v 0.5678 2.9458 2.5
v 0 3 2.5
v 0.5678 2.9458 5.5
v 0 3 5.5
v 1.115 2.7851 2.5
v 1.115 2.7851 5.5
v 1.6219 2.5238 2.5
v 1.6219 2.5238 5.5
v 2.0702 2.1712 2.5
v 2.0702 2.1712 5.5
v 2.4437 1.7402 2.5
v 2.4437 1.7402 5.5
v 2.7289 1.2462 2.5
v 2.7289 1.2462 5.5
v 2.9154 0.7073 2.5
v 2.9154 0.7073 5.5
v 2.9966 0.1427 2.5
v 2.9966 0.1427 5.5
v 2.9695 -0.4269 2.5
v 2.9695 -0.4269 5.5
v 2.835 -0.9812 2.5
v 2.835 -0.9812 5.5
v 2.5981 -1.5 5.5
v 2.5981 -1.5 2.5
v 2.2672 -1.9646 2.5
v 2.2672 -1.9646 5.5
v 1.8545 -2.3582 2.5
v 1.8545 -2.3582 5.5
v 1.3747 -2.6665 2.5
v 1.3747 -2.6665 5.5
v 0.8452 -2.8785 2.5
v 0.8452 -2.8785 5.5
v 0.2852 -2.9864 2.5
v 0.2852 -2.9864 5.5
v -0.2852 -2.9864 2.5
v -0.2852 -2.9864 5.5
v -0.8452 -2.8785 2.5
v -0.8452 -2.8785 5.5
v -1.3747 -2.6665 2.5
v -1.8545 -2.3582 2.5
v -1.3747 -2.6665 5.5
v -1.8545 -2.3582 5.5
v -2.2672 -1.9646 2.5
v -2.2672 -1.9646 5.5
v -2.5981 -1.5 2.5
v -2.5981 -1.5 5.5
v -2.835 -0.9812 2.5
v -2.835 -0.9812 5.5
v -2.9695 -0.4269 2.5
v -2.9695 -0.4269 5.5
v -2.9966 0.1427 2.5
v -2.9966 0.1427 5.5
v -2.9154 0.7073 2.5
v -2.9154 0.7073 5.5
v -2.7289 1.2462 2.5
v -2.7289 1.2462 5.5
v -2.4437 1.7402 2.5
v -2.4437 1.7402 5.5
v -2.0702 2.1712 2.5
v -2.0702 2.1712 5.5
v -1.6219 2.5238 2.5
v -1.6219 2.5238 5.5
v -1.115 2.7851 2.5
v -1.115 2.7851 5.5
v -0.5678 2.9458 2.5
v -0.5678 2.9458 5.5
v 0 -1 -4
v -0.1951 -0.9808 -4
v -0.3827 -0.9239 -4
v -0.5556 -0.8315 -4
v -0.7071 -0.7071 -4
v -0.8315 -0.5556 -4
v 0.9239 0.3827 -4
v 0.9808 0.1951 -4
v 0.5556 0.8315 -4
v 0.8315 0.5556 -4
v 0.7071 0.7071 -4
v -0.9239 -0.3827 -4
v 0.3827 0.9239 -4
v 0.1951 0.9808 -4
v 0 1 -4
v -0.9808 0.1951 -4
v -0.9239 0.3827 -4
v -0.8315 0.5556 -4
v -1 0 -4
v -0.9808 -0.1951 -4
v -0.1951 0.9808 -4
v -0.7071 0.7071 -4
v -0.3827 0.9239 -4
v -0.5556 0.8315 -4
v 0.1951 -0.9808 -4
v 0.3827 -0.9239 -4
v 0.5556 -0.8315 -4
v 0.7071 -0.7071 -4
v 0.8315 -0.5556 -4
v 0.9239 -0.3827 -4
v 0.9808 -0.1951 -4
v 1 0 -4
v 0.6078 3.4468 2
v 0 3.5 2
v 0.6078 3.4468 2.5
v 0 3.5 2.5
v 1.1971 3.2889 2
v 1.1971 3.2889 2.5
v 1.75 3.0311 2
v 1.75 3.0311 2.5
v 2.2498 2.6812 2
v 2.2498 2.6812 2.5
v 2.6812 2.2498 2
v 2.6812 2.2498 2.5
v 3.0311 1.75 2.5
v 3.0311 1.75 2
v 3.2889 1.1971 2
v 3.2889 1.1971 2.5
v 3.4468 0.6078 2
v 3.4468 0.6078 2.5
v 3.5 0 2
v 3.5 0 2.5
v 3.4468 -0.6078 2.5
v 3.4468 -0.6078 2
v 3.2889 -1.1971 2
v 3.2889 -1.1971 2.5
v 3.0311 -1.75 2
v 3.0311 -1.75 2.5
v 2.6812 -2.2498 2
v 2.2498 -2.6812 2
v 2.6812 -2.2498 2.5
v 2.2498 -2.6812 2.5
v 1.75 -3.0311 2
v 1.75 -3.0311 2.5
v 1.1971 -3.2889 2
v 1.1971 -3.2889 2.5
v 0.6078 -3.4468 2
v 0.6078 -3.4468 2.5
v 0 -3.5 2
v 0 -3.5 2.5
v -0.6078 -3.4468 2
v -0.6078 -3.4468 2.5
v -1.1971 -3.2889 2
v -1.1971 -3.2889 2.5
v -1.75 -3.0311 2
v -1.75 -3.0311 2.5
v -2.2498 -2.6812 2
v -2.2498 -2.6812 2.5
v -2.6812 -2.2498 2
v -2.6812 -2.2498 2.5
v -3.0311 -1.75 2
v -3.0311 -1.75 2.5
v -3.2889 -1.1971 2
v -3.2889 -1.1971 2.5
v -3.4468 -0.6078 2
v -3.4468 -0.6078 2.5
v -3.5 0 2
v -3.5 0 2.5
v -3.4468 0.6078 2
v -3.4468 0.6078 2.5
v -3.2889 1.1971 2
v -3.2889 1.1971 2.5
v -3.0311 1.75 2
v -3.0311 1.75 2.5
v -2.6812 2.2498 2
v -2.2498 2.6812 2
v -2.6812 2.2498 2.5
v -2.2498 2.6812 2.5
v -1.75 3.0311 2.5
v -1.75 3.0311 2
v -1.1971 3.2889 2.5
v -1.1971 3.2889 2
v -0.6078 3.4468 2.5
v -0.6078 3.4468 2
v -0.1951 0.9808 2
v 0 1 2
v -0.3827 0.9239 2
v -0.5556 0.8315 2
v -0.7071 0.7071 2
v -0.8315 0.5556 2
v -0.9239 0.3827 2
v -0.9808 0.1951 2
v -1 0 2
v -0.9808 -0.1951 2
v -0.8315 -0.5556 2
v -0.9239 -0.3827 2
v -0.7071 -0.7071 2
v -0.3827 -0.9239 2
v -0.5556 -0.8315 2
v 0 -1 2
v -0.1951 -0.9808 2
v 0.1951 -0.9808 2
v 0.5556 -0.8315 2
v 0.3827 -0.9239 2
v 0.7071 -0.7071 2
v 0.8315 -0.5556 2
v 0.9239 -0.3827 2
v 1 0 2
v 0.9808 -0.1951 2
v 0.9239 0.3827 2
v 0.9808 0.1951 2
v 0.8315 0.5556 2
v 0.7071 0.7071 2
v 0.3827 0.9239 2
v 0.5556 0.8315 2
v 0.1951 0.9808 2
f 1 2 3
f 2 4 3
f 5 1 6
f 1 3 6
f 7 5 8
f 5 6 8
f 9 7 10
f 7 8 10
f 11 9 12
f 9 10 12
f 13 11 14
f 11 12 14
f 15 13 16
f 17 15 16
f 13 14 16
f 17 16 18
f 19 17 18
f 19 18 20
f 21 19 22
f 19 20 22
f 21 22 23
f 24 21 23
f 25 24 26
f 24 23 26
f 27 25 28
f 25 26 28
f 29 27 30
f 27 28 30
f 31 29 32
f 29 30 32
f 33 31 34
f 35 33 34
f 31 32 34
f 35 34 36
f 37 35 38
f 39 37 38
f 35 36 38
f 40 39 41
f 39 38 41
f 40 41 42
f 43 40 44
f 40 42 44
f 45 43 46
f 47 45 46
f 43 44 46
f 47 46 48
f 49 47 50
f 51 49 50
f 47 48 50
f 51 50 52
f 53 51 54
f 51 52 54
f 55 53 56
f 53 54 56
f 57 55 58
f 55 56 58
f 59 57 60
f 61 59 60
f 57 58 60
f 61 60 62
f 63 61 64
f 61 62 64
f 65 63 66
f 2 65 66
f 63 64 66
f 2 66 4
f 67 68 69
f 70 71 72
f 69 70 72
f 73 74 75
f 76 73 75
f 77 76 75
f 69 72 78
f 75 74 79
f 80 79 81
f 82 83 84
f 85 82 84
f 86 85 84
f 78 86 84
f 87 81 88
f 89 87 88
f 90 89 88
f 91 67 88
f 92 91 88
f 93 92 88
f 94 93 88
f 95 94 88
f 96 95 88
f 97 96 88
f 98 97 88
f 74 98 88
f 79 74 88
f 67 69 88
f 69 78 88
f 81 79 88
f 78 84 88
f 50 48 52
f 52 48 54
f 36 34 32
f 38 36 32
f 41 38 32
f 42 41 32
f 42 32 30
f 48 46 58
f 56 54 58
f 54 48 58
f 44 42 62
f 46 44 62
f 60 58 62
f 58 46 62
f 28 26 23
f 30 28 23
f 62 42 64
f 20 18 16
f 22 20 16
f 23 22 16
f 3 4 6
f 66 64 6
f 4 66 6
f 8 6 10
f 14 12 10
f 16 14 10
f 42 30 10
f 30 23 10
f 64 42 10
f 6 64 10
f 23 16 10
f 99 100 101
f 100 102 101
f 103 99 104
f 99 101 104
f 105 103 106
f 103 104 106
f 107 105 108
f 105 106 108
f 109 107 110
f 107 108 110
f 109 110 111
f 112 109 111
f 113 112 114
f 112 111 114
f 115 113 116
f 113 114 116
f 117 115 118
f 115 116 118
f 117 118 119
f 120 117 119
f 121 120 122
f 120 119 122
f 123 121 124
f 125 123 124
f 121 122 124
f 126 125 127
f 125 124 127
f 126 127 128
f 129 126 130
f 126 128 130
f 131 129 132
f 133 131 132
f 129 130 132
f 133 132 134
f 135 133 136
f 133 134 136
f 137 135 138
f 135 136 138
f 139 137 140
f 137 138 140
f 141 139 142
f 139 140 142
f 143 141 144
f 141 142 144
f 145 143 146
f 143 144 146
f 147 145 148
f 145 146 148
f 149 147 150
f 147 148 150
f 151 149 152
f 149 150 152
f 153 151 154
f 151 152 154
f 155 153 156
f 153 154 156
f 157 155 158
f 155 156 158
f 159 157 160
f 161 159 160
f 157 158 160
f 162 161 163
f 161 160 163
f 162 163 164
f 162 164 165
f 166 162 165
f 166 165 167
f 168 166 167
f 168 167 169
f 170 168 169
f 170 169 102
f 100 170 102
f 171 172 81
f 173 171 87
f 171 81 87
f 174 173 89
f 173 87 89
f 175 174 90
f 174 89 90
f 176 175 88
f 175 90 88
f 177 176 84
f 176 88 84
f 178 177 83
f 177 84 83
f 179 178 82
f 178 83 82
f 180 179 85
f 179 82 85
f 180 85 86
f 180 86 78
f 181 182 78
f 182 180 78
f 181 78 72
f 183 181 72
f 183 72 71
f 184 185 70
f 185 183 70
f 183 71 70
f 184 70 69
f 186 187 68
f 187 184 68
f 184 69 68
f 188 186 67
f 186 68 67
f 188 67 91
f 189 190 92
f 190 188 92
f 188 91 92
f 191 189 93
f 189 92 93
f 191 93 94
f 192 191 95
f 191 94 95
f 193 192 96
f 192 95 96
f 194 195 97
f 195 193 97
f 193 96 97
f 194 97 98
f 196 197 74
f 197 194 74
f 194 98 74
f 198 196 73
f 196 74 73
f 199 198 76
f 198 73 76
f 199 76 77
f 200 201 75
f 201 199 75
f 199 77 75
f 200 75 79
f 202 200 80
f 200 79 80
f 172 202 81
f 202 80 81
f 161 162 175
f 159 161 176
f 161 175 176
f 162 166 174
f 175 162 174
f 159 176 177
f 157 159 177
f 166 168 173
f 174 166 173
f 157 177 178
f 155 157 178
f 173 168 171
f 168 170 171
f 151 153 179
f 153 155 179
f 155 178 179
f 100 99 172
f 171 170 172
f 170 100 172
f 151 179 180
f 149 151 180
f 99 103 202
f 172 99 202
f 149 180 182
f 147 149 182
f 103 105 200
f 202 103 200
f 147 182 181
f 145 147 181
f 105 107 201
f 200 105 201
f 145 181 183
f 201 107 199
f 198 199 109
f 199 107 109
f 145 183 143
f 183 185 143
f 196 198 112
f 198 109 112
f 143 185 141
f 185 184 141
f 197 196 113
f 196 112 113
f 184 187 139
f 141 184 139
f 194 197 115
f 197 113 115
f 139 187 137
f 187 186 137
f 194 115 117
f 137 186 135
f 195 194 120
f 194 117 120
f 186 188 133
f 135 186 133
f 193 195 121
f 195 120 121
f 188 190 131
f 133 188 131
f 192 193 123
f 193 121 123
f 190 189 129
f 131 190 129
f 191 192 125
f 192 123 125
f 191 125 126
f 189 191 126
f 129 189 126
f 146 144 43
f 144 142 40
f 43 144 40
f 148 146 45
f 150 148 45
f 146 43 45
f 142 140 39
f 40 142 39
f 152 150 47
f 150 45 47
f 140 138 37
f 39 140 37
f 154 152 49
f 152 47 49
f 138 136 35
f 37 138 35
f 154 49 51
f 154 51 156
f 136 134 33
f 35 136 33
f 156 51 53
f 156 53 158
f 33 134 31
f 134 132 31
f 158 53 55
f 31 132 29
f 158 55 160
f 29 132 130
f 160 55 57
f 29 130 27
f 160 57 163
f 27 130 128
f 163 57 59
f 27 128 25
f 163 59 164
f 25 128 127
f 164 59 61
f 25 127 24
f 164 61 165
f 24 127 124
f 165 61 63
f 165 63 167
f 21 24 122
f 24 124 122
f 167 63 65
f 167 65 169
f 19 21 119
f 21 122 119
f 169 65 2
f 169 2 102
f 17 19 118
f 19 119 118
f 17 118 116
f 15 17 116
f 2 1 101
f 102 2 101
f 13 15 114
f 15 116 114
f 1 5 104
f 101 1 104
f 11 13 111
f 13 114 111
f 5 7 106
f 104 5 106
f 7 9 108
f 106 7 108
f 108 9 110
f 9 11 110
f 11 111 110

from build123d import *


with BuildPart() as part:
    # Skizze1 → Rotation1 (revolve)
    with BuildSketch(Plane(origin=(0, 0, 0), x_dir=(0, 0, -1), z_dir=(1, 0, 0))):
        Polygon((4, 1), (4, 0), (-4, 0), (-3, 1), align=None)
    revolve(axis=Axis((0, 0, 0), (0, 0, 1)))

    # Skizze2 → Rotation2 (revolve)
    with BuildSketch(Plane(origin=(0, 0, 0), x_dir=(0, 0, -1), z_dir=(1, 0, 0))):
        Polygon((-2.5, 3), (-5.5, 3), (-5.5, 0), (-2, 0), (-2, 3.5), (-2.5, 3.5), align=None)
    revolve(axis=Axis((0, 0, 2), (0, 0, -1)))


solid = part.part
